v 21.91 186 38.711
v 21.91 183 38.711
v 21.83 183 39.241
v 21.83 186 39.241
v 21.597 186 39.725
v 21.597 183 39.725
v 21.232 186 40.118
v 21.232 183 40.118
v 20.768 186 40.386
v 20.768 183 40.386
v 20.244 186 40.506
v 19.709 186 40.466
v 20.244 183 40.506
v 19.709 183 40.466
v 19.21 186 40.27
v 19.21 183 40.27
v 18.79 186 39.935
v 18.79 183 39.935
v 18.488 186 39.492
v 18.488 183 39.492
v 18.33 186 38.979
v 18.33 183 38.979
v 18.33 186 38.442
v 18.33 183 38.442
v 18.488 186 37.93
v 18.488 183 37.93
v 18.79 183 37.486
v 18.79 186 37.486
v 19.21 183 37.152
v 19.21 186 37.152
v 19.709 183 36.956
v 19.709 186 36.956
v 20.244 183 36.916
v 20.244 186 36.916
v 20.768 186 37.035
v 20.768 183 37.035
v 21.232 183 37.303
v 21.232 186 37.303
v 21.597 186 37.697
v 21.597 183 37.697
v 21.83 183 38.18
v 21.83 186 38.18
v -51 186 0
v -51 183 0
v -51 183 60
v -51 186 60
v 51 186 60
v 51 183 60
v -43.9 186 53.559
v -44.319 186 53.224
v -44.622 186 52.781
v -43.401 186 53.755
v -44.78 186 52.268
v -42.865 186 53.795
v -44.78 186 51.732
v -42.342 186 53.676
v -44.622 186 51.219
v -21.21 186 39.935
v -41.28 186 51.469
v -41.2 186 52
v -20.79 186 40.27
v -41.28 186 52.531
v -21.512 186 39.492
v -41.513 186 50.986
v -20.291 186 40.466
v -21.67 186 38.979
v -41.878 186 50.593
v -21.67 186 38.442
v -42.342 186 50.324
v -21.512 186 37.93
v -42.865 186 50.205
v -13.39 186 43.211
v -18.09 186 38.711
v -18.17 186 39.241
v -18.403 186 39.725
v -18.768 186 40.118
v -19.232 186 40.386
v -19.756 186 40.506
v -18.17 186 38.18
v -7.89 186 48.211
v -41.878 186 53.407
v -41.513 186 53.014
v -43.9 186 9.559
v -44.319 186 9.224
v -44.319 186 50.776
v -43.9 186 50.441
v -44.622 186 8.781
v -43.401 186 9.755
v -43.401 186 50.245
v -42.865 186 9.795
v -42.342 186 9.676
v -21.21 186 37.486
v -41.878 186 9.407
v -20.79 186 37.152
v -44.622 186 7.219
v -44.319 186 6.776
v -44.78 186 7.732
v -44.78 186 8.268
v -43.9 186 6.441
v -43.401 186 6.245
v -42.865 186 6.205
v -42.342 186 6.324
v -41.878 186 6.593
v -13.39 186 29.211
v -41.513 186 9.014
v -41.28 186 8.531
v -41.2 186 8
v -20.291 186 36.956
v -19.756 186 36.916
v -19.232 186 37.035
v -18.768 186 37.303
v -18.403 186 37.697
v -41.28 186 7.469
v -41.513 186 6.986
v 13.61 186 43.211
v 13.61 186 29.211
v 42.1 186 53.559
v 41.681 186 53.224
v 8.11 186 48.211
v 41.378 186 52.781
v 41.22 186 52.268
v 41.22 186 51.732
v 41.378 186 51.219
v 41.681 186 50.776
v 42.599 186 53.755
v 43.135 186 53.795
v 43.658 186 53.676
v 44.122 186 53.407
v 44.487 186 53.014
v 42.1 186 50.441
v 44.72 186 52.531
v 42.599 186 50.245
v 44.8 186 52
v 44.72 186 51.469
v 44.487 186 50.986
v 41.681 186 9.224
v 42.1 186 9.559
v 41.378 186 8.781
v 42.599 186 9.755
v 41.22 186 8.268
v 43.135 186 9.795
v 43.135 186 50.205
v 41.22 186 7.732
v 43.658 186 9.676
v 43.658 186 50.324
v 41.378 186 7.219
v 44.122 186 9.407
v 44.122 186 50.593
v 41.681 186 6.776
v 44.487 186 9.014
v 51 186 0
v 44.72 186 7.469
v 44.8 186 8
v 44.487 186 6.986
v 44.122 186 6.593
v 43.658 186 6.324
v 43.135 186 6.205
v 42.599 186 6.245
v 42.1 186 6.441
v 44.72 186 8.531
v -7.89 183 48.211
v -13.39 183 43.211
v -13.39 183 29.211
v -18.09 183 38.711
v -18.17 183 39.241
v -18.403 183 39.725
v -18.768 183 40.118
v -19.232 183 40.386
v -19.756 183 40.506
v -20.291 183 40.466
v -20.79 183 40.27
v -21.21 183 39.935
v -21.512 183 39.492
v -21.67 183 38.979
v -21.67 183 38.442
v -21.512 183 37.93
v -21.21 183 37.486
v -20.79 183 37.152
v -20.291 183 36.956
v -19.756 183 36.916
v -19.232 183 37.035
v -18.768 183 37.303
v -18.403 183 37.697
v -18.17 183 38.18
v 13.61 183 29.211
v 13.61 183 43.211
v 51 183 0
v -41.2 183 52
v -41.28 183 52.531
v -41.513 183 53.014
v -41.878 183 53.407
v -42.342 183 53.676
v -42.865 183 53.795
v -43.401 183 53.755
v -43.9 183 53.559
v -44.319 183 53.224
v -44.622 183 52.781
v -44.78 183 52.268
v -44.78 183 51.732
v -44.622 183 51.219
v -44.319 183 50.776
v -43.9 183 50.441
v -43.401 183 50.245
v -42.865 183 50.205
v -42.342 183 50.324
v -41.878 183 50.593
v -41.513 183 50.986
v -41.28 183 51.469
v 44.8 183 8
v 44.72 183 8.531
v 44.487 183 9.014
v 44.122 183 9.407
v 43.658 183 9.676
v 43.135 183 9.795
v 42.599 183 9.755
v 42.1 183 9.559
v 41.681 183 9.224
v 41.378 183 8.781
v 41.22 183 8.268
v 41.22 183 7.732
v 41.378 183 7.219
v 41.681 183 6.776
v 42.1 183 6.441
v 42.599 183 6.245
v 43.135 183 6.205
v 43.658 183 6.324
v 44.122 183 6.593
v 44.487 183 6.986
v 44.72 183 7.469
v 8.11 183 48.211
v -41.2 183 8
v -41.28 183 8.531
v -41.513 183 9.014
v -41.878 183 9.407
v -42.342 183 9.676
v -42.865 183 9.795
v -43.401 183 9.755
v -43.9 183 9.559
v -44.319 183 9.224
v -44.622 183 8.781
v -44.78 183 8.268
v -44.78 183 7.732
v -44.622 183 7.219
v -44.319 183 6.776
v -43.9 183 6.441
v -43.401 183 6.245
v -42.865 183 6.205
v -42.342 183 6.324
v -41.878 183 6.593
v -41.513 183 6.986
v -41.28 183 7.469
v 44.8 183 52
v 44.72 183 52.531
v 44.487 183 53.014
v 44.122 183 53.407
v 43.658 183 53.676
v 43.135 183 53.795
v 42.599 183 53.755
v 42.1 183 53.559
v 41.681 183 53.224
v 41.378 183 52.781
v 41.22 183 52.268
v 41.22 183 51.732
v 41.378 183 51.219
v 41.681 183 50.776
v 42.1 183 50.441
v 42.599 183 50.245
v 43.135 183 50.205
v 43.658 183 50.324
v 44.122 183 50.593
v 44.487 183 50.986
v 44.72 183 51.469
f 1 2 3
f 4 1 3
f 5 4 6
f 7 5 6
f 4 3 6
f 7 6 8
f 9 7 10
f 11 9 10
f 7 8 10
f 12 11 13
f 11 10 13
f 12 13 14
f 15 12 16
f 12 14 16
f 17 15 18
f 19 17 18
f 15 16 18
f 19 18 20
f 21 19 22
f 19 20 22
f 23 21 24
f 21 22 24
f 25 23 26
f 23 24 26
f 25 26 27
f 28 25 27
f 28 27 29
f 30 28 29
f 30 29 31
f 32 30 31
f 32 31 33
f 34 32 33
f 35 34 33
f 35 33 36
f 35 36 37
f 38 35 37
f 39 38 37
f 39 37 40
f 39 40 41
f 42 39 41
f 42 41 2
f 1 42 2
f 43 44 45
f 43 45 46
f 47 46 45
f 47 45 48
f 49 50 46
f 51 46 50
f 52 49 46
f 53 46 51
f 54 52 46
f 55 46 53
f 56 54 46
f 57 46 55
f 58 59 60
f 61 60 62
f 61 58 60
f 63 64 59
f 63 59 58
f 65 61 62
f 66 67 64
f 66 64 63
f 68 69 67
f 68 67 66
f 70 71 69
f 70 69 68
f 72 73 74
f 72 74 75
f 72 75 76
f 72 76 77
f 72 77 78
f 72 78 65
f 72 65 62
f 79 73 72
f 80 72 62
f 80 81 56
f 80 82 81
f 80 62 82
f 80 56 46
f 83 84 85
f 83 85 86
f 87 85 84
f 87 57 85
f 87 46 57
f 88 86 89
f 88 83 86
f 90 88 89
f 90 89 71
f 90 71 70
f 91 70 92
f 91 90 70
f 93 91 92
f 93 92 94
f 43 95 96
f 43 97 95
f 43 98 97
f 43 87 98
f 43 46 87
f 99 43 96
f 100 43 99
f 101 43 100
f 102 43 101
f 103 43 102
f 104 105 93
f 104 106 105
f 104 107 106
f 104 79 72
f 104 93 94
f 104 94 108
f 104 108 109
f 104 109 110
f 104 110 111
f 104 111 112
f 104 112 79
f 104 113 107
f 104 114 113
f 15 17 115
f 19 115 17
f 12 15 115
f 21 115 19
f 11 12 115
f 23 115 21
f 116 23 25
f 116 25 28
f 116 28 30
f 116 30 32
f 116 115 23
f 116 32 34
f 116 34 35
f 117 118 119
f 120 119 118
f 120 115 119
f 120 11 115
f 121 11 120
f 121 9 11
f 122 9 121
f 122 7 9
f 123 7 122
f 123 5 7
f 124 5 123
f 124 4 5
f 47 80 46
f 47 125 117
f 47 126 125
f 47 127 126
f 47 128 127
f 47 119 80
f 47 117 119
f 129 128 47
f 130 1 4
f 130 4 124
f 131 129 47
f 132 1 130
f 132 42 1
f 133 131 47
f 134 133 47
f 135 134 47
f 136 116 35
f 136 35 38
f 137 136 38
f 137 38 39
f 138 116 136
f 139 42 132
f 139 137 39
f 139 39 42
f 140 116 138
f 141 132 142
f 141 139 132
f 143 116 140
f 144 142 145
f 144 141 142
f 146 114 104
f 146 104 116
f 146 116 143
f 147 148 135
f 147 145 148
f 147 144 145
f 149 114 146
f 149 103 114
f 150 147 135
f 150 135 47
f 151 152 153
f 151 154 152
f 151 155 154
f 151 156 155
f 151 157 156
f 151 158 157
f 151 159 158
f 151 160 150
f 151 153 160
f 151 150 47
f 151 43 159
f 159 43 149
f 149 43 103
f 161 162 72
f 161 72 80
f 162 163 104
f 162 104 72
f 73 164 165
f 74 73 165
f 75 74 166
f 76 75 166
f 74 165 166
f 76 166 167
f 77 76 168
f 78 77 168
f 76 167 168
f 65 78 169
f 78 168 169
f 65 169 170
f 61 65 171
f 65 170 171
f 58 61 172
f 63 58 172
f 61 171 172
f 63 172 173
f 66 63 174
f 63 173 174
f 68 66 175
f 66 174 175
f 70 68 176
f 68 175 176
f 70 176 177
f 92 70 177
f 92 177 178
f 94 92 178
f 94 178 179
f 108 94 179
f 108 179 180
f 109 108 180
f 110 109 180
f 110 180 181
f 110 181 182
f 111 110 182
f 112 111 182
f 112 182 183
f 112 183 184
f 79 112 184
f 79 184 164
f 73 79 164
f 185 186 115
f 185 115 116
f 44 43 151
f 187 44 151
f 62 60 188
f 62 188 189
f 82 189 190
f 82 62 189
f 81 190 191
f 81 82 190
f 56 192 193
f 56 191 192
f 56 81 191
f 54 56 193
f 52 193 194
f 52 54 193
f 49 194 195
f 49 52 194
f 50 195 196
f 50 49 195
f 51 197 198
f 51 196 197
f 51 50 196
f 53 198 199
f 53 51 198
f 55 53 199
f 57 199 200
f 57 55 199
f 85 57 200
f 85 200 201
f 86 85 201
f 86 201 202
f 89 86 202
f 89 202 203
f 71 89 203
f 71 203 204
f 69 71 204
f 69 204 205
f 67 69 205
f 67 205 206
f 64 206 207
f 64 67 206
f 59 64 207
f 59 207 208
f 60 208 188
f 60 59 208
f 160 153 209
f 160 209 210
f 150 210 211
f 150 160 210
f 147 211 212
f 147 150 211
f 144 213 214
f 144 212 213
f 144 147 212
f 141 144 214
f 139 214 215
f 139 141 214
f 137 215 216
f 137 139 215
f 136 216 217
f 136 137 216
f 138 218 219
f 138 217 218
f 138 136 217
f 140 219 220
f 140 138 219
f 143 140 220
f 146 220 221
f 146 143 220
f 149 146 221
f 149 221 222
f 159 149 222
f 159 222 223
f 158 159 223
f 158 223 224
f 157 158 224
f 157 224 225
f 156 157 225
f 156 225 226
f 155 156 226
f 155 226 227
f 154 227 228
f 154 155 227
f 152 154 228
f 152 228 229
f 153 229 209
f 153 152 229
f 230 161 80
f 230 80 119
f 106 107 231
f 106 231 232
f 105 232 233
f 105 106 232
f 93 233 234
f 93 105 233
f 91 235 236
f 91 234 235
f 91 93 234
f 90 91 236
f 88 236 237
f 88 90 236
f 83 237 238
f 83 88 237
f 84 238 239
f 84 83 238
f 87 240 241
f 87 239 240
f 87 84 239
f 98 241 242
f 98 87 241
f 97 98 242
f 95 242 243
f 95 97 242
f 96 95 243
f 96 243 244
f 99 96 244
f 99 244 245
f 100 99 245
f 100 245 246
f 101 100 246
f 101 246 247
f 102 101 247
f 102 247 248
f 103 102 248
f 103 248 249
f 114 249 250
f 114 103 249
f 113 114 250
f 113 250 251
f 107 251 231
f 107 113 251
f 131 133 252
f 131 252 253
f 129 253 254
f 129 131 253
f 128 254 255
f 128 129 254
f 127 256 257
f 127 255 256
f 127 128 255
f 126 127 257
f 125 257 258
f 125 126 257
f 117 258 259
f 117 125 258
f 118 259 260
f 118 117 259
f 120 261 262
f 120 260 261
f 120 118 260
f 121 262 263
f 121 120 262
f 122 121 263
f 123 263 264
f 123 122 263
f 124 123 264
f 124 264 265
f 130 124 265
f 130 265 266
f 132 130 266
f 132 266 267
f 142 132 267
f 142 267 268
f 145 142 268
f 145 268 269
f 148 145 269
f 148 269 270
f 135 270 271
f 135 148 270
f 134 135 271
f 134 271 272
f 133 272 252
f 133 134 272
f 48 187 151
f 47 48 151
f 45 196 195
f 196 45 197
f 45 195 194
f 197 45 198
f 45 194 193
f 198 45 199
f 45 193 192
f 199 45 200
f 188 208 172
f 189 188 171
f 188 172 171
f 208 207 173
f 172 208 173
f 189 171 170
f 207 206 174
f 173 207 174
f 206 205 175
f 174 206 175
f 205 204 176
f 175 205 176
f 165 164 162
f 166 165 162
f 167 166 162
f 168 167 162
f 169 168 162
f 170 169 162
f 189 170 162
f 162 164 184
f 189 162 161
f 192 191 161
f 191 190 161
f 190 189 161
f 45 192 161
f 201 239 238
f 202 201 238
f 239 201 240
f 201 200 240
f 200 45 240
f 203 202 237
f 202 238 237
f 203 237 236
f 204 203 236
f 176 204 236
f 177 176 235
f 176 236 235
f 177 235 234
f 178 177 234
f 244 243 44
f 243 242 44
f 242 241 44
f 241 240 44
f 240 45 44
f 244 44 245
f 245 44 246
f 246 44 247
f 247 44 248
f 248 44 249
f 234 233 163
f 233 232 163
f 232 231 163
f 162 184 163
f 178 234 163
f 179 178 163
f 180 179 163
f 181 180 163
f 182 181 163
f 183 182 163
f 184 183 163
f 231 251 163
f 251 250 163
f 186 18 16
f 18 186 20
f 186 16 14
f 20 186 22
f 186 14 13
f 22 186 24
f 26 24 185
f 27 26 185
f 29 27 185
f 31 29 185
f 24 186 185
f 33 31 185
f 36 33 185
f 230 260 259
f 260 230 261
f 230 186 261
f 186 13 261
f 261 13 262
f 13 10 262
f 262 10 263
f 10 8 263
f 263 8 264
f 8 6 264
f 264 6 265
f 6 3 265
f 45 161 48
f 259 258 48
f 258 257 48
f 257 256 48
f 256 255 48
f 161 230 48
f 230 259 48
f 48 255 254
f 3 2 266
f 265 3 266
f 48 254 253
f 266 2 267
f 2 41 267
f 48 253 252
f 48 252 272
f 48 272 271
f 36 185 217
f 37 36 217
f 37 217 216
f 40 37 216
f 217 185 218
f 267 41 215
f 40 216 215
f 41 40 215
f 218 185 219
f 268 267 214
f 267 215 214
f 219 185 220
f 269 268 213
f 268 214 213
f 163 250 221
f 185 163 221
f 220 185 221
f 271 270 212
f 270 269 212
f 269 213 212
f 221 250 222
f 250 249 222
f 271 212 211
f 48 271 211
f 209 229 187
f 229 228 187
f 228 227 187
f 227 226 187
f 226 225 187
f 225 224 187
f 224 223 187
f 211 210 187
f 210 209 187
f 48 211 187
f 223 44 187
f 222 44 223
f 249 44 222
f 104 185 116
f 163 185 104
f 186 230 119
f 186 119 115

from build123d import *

# Parameters (mm, degrees)
SKETCH003_R                = 1.8
EXTRUDE002_DEPTH           = 10
EXTRUDE002_PLACEMENT_ANGLE = 90
CYLINDER002_R              = 1.8
CYLINDER002_DEPTH          = 200
ARRAY_X_COUNT              = 2
ARRAY_X_PITCH              = 86
ARRAY_Z_COUNT              = 2
ARRAY_Z_PITCH              = 44
BOX008_W                   = 102
BOX008_H                   = 3
BOX008_DEPTH               = 60


with BuildPart() as power_input_extrude:
    # Sketch003 → Extrude002 (new body)
    with BuildSketch(Plane.XY):
        with Locations((39.109962, 21.410699)):
            Circle(SKETCH003_R)
        with Locations((79.109962, 21.410699)):
            Circle(SKETCH003_R)
        Polygon((45.609962, 11.910699), (45.609962, 25.910699), (51.109962, 30.910699), (67.109962, 30.910699), (72.609962, 25.910699), (72.609962, 11.910699), align=None)
    extrude(amount=-EXTRUDE002_DEPTH)


with BuildPart() as power_input_extrude_1:
    # Extrude002 placement: moved
    add(power_input_extrude.part.moved(Location((-59, 180, 17.3))).rotate(Axis((-59, 180, 17.3), (1, 0, 0)), EXTRUDE002_PLACEMENT_ANGLE))


with BuildPart() as back_wall_hole_fusion:
    # Cylinder002 → Cylinder002 (new body)
    with BuildSketch(Plane(origin=(-43, 200, 8), x_dir=(1, 0, 0), z_dir=(0, -1, 0))):
        Circle(CYLINDER002_R)
    extrude(amount=CYLINDER002_DEPTH)

    # Array X: back wall hole fusion ×2


with BuildPart() as back_wall_hole_fusion_1:
    add(back_wall_hole_fusion.part)
    with Locations(*[(i * ARRAY_X_PITCH, 0, 0) for i in range(1, ARRAY_X_COUNT)]):
        add(back_wall_hole_fusion.part)

    # Array Z: back wall hole fusion ×2


with BuildPart() as back_wall_hole_fusion_2:
    add(back_wall_hole_fusion_1.part)
    with Locations(*[(0, 0, i * ARRAY_Z_PITCH) for i in range(1, ARRAY_Z_COUNT)]):
        add(back_wall_hole_fusion_1.part)

    # Fusion006: union power input extrude
    add(power_input_extrude_1.part)


with BuildPart() as back_wall_cut:
    # Box008 → Box008 (new body)
    with BuildSketch(Plane(origin=(-51, 183, 0), x_dir=(1, 0, 0), z_dir=(0, 0, 1))):
        with Locations((51, 1.5)):
            Rectangle(BOX008_W, BOX008_H)
    extrude(amount=BOX008_DEPTH)

    # Cut009: cut back wall hole fusion
    add(back_wall_hole_fusion_2.part, mode=Mode.SUBTRACT)


solid = back_wall_cut.part
